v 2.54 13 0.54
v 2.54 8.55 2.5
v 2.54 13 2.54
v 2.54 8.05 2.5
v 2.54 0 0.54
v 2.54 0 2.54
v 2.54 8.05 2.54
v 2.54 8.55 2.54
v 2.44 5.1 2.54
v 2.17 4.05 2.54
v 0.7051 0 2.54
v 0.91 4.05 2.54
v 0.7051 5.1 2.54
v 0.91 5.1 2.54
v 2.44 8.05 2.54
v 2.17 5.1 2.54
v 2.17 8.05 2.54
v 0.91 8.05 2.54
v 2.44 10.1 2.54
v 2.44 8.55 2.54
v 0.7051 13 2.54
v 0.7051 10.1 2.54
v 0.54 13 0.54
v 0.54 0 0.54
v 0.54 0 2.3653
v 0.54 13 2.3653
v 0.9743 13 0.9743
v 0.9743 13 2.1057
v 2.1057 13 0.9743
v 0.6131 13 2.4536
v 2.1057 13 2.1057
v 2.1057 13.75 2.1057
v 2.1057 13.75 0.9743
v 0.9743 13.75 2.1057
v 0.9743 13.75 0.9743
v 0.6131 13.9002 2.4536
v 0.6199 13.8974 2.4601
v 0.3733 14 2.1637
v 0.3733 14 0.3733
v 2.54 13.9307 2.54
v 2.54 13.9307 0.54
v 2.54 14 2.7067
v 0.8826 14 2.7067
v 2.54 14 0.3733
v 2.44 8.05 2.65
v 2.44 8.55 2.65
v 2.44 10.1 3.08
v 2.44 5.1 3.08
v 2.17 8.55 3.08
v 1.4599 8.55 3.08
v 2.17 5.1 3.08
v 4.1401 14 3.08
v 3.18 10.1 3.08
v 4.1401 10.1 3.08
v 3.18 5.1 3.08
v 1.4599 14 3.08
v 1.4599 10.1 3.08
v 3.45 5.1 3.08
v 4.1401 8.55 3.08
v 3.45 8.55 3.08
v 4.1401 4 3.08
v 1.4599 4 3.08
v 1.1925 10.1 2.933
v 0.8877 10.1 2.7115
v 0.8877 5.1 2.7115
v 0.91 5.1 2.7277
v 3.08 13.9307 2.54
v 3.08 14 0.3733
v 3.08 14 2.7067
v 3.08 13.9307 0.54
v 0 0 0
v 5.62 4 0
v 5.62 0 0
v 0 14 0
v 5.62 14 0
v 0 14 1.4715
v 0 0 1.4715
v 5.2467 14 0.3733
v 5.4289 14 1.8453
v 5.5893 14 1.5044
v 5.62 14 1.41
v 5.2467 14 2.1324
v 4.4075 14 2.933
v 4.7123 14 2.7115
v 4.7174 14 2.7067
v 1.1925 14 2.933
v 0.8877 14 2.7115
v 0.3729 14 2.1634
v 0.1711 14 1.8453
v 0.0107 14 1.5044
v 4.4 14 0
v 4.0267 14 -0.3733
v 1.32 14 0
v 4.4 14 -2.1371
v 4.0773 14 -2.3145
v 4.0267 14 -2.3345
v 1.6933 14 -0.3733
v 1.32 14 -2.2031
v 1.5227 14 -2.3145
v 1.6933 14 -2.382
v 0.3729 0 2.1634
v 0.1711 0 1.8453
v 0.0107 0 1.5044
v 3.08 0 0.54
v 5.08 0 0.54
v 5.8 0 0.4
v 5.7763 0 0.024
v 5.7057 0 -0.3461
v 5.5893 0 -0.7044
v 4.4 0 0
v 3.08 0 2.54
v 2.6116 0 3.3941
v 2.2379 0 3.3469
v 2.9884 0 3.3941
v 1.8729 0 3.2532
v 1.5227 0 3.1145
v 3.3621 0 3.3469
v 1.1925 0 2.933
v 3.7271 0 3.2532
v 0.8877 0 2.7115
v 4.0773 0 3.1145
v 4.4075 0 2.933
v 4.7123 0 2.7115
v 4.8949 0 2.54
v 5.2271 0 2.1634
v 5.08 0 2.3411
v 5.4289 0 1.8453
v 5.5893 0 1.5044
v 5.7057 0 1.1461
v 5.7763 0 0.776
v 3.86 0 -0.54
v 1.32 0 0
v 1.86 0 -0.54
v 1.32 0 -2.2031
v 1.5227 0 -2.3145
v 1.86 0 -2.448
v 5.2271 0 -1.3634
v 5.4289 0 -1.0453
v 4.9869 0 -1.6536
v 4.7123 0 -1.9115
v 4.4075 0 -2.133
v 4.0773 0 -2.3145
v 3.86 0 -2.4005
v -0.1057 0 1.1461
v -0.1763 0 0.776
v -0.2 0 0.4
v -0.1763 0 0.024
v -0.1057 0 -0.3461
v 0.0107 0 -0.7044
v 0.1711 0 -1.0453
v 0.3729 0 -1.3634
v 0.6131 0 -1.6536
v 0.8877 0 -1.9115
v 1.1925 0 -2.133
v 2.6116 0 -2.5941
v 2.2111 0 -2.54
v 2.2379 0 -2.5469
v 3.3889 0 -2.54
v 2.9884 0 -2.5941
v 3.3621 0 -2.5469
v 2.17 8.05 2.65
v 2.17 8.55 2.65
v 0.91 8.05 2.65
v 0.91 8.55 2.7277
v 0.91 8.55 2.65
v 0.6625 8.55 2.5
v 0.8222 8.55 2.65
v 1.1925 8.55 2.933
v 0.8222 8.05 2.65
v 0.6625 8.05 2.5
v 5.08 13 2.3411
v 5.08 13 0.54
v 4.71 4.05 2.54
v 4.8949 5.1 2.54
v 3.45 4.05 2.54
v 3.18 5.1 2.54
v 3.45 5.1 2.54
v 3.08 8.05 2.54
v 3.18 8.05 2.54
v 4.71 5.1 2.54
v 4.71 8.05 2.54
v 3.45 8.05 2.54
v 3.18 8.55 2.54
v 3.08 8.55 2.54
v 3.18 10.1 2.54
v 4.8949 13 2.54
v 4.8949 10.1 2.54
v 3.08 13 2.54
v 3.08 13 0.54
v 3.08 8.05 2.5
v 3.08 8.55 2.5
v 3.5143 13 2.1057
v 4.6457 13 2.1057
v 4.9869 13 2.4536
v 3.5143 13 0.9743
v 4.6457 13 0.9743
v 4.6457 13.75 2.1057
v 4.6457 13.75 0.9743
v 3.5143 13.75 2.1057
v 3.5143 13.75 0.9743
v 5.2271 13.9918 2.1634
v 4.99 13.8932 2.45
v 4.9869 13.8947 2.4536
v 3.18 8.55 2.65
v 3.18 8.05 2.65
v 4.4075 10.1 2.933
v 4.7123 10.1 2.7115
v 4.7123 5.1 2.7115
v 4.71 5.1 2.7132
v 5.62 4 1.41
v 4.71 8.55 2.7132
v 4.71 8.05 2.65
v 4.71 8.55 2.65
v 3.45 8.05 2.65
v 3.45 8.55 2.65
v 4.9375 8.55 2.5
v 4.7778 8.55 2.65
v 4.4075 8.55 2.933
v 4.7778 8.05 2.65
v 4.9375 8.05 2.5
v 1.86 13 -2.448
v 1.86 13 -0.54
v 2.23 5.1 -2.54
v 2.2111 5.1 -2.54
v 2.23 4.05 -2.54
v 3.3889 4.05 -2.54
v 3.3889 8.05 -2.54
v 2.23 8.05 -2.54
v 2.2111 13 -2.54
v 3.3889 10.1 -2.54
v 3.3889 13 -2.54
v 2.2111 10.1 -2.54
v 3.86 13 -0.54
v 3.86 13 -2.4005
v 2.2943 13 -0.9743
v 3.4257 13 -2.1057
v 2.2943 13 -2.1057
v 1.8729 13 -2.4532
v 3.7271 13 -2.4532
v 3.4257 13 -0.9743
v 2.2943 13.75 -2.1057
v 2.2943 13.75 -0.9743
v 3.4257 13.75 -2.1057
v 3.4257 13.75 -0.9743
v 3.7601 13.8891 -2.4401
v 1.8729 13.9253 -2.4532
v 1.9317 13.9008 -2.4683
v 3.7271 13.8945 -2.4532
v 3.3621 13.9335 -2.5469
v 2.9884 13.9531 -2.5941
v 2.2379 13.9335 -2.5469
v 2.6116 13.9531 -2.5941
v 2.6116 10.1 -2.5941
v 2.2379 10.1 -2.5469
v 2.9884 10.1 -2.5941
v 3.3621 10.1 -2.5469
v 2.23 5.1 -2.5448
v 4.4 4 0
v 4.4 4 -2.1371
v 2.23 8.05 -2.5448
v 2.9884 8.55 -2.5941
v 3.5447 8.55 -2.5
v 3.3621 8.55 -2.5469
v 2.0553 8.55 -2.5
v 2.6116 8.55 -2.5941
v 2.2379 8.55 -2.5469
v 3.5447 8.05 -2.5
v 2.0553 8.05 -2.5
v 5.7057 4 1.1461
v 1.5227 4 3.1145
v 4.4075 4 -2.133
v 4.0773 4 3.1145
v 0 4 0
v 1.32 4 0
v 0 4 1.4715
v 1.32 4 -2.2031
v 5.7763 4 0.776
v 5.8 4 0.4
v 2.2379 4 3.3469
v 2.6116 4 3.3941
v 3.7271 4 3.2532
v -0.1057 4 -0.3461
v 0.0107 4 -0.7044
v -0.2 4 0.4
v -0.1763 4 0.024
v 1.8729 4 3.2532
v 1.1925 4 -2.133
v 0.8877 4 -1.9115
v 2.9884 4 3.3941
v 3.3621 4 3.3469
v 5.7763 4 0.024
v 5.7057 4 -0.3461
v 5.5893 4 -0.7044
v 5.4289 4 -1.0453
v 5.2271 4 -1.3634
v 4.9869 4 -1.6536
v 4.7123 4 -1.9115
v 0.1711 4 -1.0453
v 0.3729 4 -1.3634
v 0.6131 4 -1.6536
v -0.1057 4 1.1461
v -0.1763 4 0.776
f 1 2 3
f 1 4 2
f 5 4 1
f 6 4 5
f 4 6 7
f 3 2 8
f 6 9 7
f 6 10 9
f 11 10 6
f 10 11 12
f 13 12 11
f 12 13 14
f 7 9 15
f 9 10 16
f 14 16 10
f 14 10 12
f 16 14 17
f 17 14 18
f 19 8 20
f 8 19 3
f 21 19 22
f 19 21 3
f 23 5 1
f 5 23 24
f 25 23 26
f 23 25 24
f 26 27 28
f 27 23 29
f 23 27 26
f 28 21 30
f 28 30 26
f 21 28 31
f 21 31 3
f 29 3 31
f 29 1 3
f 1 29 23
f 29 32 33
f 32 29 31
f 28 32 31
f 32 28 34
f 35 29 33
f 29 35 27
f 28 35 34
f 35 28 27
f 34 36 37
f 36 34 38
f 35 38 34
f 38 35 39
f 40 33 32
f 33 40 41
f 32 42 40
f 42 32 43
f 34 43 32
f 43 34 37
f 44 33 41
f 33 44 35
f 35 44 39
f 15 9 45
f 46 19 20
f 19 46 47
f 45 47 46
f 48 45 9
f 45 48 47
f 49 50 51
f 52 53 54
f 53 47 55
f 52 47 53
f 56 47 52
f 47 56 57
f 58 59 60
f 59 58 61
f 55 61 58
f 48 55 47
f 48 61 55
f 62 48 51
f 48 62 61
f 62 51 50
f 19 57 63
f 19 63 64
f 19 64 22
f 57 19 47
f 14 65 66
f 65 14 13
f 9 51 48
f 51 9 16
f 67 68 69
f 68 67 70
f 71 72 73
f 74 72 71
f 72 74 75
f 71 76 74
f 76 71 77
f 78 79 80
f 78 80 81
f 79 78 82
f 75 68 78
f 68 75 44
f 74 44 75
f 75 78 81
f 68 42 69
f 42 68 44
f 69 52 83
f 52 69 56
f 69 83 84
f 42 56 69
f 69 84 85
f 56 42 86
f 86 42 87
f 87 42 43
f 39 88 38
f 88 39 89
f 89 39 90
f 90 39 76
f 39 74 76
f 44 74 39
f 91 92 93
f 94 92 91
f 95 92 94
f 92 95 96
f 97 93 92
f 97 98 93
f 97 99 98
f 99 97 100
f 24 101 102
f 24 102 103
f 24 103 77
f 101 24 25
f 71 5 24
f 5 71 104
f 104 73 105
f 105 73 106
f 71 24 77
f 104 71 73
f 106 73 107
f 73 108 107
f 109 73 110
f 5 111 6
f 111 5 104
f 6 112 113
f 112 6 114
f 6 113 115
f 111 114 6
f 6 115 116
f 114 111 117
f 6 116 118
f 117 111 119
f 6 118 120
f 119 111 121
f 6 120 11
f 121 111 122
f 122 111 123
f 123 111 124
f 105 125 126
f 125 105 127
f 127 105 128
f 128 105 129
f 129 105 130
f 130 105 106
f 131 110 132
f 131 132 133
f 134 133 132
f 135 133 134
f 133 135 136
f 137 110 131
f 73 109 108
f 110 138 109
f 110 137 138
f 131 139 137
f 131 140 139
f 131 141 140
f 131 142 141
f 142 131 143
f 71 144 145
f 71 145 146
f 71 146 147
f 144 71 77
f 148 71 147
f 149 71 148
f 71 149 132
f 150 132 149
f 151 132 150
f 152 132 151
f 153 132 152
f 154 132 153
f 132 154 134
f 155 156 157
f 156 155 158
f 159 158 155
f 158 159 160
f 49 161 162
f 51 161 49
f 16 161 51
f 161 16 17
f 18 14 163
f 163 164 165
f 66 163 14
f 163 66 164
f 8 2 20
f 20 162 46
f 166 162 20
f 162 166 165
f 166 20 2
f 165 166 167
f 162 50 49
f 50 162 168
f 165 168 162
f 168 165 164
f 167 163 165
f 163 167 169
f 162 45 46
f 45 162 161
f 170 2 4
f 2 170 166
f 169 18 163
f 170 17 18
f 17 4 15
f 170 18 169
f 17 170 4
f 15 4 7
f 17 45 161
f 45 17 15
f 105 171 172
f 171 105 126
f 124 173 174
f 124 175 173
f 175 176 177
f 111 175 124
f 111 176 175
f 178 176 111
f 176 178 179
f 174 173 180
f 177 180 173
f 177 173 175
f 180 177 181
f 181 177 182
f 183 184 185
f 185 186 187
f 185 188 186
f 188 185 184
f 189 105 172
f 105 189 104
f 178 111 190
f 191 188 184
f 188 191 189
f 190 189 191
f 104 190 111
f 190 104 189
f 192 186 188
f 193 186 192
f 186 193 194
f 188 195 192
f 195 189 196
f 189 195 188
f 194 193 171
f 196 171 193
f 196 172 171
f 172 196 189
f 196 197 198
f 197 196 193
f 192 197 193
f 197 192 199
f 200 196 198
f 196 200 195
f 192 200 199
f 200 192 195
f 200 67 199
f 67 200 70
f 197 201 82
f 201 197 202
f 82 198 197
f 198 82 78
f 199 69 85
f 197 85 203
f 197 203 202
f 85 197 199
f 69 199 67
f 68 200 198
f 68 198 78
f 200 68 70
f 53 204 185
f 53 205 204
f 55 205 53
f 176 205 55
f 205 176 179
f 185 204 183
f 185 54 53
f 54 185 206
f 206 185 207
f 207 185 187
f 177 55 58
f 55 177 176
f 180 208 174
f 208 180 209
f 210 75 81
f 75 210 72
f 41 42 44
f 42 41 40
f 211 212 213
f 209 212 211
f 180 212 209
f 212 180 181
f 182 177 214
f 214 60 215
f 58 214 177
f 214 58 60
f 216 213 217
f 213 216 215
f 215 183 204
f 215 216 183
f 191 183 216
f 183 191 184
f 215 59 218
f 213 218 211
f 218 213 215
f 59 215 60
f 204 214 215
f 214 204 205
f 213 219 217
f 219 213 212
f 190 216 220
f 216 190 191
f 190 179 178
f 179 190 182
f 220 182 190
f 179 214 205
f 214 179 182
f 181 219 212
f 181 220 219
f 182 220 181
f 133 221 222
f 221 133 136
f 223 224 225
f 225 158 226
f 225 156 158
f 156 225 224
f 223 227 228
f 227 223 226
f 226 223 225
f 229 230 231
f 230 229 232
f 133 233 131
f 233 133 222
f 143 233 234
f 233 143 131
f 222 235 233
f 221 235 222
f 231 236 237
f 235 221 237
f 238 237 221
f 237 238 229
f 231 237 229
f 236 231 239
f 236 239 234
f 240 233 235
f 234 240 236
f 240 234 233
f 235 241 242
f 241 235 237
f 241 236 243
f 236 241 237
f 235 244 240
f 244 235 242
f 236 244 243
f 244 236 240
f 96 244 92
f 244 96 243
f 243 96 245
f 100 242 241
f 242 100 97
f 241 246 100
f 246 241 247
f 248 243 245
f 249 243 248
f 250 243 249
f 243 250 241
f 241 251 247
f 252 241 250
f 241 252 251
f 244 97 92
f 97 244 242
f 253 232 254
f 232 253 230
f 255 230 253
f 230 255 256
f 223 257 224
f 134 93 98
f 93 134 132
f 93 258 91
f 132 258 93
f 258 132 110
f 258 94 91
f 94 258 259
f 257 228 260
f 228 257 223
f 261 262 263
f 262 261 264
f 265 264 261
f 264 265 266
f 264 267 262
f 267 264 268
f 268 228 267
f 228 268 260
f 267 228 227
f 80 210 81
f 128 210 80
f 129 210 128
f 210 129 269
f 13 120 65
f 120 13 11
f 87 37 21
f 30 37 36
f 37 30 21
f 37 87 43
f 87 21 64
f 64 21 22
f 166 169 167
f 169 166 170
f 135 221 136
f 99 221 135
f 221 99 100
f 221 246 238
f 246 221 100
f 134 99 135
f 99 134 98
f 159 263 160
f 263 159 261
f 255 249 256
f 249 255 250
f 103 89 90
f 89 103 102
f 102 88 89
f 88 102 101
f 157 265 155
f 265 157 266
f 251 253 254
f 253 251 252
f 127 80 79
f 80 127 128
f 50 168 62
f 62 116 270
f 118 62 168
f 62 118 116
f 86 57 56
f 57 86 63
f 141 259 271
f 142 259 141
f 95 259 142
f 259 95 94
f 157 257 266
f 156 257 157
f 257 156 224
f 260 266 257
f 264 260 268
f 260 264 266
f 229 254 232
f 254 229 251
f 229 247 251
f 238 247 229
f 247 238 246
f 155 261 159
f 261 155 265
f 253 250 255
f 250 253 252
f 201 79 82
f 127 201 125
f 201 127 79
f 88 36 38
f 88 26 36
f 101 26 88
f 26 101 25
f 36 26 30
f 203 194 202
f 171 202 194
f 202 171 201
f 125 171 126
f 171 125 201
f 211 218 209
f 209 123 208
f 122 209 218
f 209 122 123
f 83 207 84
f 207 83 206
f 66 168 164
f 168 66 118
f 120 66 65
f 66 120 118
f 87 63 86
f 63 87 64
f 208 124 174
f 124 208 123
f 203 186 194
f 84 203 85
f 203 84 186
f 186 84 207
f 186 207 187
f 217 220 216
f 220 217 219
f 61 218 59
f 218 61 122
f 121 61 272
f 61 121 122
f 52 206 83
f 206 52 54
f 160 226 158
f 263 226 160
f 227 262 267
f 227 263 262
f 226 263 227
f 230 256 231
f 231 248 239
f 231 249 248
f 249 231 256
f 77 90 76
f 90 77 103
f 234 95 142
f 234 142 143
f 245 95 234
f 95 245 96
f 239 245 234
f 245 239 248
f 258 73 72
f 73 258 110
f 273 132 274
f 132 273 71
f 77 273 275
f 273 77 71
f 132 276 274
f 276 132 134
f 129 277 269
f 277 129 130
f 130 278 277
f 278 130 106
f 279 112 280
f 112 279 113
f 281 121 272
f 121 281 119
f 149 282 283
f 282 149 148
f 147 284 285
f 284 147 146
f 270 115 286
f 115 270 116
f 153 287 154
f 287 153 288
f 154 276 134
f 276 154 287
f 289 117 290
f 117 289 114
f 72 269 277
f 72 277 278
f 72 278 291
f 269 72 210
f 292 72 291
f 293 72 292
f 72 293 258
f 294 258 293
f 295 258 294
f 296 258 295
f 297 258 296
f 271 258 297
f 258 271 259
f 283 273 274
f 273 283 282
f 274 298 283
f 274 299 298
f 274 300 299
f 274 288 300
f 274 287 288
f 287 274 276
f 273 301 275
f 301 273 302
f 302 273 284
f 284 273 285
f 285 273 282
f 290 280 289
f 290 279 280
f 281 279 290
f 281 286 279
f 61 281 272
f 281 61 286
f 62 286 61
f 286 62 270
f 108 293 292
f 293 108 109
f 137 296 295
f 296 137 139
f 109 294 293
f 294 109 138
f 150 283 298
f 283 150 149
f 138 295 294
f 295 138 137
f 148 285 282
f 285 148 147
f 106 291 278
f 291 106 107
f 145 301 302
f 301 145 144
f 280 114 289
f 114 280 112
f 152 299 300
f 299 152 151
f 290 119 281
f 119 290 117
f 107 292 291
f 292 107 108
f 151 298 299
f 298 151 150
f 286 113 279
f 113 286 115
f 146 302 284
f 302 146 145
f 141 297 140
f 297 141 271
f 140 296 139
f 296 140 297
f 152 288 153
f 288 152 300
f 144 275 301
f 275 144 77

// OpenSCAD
// remixed the model from Jaap_aap
//
// connector pins are numbered this way
// row 1:   1 - 2 - 3 - 4 - 5 .... n
// row 2:   n+1 - n+2, n+3 .... 2n
// change the 4 settings below to customize your connector]

//number of connector rows
rows = 1;  // [1, 2]
pins = 1;  // number of pins per row
show_pin1 = false; // show the triangle indicator for pin 1
triangle_height = 1.5;
pin1_triangle = show_pin1?triangle_height:0;
keys = [3,9]; // slots to be filled solid for keying the connector

spacing = 2.54; // pin to pin spacing 2.54mm
wall = 0.54;    // shell wall thickness
length = 14;  // connector length
function cavity(s,w) = s-w; // shell cavity to hold the connector pin;

// each pin shell will consist of the cavity and a wall on each side
// the walls on adjacent shells will overlap
function shell(c,w) = c+(2*w);

// for inverting offset values between row 1 and 2
pos_neg = [1,1,-1];

module triangle(p1_triangle_height,sh){
  linear_extrude(p1_triangle_height)
    polygon(points = [[-sh/2,0],[0,sh*0.85],[sh/2,0]], paths = [[0,1,2,0]]);
}

module add_shell(pin, row, filled_position, p1_triangle_height, sp, w, l, c, sh) {
    tab_cavity_length = 5;
    tab_length = 4.5;
    tab_hole_pos = (l - tab_cavity_length)/2 -3.9;// 3.9mm from the end
    tab_pos = tab_hole_pos - tab_cavity_length -0.8 + tab_length; 
    translate([sh/2, l/2, sh/2])
    union(){
        difference(){
            // draw the basic block
            translate([0,0,0])cube([sh,l,sh], center = true);

            if (filled_position != true){
                // hollow out space for the pin body, but leave an end
                // in place to prevent the pin from going all the way through
                translate([0,-1,0])cube([c,l,c],center = true);

                // put a smaller hole in the opposite end for receiving the mating pin
                // make a square rod for the hole using the cylinder command with
                // only 4 facets for the perimeter surface
                rotate([90, 45, 0])
                cylinder(r = 0.4*c, h = l+6, center = true, $fn = 4);

                // now chamfer that end
                translate([0, l/2, 0])rotate([90, 45, 0])
                cylinder(r1 = 1.25*c, r2 = 0.4*c, h = c/4,
                         center = true, $fn = 4);

                // make the hole for the tab
                translate([0, tab_hole_pos, pos_neg[row]*(c+w)/2])
                cube([0.9*c, tab_cavity_length, w], center = true);
                
            }
        }
        // add the tab
        translate([0, tab_pos,
                   pos_neg[row]*(c+w)/2])
        cube([0.9*c - w, tab_length, w], center = true);
        
        // if the top row, make a break-away support for the tab
        if (row == 1){
            
            translate([0, tab_pos+2,
                       pos_neg[row]*((c+w/2)/2-0.1)])
            cube([c, 0.5, 0.15], center = true);
        }    
        
        // if pin 1 add the triangle indicator
        if (pin==1 && row==1 && p1_triangle_height>0){
            translate([0,l/2-sh, c/2+w])
            triangle(p1_triangle_height,sh);
         }
    }
}

module tests(r,p,k,p1_t){
  assert((r==1 || r==2), "rows must be 1 or 2");
  assert(p>=1, "pins must be >=1");
  assert(is_list(k), "keys must be a list");
  assert(p1_t >=0, "triangle_height must be >= 0");
  
}
module dupont_connector(r,p,k,p1_t=1.5,sp=2.54,w=0.54,l=14){
  tests(r,p,k,p1_t);
  c = cavity(sp, w); // cavity
  sh = shell(c,w); // shell
  for(j = [1:r]) {
      for(i = [1:p]) {
          translate([(i - 1) * sp,0,(r - j) * sp])
          render() add_shell(i, j, search(i + (j - 1) * p, k)==[]?false:true,p1_t, sp, w, l, c, sh);
      }
  }
}

function dupont_connector_size(r,p,k,p1_t=1.5,sp=2.54,w=0.54,l=14) = [
  (((sp-w)+(2*w))*p)-w*(p-1),
  l,
  (((sp-w)+(2*w))*r)-w*(r-1)];

module dupont_connector_solid(r,p,k,p1_t=1,sp=2.54,w=0.54,l=14){
  tests(r,p,k,p1_t);
  shell_size = dupont_connector_size(r,p,k,p1_t,sp,w,l);
  c = cavity(sp, w);
  sh = shell(c,w);
  union(){
    cube(shell_size);
    if(p1_t >=0)
      translate([0,0,shell_size[2]])
        translate([sh/2,l-sh, 0])
        triangle(p1_t, sh);
  }
}

$fn=50;
module dupont_3(solid=false){
    if(solid){
        dupont_connector_solid(rows,2,keys,pin1_triangle,spacing,wall,length);
        translate([4.4,0,0])
        rotate([0,180,0]) 
        dupont_connector_solid(rows,1,keys,pin1_triangle,spacing,wall,length);
    }else{
        dupont_connector(rows,2,keys,pin1_triangle,spacing,wall,length);
        translate([4.4,0,0])
        rotate([0,180,0]) 
        dupont_connector(rows,1,keys,pin1_triangle,spacing,wall,length);
    }
}
module dupont_3_round( d=8,h=4 ){
    intersection()
    {
        translate([2.8,14,0.4]) rotate([90,0,0]) cylinder(d=d,h=14);
        dupont_3();
    }
    
    difference(){
        translate([2.8,h,0.4]) rotate([90,0,0]) 
            cylinder(d=d,h=h);
        dupont_3(solid=true);
    }
}

*dupont_connector(rows,pins,keys,pin1_triangle,spacing,wall,length);
dupont_3_round( d=6 );
*dupont_3(true);
